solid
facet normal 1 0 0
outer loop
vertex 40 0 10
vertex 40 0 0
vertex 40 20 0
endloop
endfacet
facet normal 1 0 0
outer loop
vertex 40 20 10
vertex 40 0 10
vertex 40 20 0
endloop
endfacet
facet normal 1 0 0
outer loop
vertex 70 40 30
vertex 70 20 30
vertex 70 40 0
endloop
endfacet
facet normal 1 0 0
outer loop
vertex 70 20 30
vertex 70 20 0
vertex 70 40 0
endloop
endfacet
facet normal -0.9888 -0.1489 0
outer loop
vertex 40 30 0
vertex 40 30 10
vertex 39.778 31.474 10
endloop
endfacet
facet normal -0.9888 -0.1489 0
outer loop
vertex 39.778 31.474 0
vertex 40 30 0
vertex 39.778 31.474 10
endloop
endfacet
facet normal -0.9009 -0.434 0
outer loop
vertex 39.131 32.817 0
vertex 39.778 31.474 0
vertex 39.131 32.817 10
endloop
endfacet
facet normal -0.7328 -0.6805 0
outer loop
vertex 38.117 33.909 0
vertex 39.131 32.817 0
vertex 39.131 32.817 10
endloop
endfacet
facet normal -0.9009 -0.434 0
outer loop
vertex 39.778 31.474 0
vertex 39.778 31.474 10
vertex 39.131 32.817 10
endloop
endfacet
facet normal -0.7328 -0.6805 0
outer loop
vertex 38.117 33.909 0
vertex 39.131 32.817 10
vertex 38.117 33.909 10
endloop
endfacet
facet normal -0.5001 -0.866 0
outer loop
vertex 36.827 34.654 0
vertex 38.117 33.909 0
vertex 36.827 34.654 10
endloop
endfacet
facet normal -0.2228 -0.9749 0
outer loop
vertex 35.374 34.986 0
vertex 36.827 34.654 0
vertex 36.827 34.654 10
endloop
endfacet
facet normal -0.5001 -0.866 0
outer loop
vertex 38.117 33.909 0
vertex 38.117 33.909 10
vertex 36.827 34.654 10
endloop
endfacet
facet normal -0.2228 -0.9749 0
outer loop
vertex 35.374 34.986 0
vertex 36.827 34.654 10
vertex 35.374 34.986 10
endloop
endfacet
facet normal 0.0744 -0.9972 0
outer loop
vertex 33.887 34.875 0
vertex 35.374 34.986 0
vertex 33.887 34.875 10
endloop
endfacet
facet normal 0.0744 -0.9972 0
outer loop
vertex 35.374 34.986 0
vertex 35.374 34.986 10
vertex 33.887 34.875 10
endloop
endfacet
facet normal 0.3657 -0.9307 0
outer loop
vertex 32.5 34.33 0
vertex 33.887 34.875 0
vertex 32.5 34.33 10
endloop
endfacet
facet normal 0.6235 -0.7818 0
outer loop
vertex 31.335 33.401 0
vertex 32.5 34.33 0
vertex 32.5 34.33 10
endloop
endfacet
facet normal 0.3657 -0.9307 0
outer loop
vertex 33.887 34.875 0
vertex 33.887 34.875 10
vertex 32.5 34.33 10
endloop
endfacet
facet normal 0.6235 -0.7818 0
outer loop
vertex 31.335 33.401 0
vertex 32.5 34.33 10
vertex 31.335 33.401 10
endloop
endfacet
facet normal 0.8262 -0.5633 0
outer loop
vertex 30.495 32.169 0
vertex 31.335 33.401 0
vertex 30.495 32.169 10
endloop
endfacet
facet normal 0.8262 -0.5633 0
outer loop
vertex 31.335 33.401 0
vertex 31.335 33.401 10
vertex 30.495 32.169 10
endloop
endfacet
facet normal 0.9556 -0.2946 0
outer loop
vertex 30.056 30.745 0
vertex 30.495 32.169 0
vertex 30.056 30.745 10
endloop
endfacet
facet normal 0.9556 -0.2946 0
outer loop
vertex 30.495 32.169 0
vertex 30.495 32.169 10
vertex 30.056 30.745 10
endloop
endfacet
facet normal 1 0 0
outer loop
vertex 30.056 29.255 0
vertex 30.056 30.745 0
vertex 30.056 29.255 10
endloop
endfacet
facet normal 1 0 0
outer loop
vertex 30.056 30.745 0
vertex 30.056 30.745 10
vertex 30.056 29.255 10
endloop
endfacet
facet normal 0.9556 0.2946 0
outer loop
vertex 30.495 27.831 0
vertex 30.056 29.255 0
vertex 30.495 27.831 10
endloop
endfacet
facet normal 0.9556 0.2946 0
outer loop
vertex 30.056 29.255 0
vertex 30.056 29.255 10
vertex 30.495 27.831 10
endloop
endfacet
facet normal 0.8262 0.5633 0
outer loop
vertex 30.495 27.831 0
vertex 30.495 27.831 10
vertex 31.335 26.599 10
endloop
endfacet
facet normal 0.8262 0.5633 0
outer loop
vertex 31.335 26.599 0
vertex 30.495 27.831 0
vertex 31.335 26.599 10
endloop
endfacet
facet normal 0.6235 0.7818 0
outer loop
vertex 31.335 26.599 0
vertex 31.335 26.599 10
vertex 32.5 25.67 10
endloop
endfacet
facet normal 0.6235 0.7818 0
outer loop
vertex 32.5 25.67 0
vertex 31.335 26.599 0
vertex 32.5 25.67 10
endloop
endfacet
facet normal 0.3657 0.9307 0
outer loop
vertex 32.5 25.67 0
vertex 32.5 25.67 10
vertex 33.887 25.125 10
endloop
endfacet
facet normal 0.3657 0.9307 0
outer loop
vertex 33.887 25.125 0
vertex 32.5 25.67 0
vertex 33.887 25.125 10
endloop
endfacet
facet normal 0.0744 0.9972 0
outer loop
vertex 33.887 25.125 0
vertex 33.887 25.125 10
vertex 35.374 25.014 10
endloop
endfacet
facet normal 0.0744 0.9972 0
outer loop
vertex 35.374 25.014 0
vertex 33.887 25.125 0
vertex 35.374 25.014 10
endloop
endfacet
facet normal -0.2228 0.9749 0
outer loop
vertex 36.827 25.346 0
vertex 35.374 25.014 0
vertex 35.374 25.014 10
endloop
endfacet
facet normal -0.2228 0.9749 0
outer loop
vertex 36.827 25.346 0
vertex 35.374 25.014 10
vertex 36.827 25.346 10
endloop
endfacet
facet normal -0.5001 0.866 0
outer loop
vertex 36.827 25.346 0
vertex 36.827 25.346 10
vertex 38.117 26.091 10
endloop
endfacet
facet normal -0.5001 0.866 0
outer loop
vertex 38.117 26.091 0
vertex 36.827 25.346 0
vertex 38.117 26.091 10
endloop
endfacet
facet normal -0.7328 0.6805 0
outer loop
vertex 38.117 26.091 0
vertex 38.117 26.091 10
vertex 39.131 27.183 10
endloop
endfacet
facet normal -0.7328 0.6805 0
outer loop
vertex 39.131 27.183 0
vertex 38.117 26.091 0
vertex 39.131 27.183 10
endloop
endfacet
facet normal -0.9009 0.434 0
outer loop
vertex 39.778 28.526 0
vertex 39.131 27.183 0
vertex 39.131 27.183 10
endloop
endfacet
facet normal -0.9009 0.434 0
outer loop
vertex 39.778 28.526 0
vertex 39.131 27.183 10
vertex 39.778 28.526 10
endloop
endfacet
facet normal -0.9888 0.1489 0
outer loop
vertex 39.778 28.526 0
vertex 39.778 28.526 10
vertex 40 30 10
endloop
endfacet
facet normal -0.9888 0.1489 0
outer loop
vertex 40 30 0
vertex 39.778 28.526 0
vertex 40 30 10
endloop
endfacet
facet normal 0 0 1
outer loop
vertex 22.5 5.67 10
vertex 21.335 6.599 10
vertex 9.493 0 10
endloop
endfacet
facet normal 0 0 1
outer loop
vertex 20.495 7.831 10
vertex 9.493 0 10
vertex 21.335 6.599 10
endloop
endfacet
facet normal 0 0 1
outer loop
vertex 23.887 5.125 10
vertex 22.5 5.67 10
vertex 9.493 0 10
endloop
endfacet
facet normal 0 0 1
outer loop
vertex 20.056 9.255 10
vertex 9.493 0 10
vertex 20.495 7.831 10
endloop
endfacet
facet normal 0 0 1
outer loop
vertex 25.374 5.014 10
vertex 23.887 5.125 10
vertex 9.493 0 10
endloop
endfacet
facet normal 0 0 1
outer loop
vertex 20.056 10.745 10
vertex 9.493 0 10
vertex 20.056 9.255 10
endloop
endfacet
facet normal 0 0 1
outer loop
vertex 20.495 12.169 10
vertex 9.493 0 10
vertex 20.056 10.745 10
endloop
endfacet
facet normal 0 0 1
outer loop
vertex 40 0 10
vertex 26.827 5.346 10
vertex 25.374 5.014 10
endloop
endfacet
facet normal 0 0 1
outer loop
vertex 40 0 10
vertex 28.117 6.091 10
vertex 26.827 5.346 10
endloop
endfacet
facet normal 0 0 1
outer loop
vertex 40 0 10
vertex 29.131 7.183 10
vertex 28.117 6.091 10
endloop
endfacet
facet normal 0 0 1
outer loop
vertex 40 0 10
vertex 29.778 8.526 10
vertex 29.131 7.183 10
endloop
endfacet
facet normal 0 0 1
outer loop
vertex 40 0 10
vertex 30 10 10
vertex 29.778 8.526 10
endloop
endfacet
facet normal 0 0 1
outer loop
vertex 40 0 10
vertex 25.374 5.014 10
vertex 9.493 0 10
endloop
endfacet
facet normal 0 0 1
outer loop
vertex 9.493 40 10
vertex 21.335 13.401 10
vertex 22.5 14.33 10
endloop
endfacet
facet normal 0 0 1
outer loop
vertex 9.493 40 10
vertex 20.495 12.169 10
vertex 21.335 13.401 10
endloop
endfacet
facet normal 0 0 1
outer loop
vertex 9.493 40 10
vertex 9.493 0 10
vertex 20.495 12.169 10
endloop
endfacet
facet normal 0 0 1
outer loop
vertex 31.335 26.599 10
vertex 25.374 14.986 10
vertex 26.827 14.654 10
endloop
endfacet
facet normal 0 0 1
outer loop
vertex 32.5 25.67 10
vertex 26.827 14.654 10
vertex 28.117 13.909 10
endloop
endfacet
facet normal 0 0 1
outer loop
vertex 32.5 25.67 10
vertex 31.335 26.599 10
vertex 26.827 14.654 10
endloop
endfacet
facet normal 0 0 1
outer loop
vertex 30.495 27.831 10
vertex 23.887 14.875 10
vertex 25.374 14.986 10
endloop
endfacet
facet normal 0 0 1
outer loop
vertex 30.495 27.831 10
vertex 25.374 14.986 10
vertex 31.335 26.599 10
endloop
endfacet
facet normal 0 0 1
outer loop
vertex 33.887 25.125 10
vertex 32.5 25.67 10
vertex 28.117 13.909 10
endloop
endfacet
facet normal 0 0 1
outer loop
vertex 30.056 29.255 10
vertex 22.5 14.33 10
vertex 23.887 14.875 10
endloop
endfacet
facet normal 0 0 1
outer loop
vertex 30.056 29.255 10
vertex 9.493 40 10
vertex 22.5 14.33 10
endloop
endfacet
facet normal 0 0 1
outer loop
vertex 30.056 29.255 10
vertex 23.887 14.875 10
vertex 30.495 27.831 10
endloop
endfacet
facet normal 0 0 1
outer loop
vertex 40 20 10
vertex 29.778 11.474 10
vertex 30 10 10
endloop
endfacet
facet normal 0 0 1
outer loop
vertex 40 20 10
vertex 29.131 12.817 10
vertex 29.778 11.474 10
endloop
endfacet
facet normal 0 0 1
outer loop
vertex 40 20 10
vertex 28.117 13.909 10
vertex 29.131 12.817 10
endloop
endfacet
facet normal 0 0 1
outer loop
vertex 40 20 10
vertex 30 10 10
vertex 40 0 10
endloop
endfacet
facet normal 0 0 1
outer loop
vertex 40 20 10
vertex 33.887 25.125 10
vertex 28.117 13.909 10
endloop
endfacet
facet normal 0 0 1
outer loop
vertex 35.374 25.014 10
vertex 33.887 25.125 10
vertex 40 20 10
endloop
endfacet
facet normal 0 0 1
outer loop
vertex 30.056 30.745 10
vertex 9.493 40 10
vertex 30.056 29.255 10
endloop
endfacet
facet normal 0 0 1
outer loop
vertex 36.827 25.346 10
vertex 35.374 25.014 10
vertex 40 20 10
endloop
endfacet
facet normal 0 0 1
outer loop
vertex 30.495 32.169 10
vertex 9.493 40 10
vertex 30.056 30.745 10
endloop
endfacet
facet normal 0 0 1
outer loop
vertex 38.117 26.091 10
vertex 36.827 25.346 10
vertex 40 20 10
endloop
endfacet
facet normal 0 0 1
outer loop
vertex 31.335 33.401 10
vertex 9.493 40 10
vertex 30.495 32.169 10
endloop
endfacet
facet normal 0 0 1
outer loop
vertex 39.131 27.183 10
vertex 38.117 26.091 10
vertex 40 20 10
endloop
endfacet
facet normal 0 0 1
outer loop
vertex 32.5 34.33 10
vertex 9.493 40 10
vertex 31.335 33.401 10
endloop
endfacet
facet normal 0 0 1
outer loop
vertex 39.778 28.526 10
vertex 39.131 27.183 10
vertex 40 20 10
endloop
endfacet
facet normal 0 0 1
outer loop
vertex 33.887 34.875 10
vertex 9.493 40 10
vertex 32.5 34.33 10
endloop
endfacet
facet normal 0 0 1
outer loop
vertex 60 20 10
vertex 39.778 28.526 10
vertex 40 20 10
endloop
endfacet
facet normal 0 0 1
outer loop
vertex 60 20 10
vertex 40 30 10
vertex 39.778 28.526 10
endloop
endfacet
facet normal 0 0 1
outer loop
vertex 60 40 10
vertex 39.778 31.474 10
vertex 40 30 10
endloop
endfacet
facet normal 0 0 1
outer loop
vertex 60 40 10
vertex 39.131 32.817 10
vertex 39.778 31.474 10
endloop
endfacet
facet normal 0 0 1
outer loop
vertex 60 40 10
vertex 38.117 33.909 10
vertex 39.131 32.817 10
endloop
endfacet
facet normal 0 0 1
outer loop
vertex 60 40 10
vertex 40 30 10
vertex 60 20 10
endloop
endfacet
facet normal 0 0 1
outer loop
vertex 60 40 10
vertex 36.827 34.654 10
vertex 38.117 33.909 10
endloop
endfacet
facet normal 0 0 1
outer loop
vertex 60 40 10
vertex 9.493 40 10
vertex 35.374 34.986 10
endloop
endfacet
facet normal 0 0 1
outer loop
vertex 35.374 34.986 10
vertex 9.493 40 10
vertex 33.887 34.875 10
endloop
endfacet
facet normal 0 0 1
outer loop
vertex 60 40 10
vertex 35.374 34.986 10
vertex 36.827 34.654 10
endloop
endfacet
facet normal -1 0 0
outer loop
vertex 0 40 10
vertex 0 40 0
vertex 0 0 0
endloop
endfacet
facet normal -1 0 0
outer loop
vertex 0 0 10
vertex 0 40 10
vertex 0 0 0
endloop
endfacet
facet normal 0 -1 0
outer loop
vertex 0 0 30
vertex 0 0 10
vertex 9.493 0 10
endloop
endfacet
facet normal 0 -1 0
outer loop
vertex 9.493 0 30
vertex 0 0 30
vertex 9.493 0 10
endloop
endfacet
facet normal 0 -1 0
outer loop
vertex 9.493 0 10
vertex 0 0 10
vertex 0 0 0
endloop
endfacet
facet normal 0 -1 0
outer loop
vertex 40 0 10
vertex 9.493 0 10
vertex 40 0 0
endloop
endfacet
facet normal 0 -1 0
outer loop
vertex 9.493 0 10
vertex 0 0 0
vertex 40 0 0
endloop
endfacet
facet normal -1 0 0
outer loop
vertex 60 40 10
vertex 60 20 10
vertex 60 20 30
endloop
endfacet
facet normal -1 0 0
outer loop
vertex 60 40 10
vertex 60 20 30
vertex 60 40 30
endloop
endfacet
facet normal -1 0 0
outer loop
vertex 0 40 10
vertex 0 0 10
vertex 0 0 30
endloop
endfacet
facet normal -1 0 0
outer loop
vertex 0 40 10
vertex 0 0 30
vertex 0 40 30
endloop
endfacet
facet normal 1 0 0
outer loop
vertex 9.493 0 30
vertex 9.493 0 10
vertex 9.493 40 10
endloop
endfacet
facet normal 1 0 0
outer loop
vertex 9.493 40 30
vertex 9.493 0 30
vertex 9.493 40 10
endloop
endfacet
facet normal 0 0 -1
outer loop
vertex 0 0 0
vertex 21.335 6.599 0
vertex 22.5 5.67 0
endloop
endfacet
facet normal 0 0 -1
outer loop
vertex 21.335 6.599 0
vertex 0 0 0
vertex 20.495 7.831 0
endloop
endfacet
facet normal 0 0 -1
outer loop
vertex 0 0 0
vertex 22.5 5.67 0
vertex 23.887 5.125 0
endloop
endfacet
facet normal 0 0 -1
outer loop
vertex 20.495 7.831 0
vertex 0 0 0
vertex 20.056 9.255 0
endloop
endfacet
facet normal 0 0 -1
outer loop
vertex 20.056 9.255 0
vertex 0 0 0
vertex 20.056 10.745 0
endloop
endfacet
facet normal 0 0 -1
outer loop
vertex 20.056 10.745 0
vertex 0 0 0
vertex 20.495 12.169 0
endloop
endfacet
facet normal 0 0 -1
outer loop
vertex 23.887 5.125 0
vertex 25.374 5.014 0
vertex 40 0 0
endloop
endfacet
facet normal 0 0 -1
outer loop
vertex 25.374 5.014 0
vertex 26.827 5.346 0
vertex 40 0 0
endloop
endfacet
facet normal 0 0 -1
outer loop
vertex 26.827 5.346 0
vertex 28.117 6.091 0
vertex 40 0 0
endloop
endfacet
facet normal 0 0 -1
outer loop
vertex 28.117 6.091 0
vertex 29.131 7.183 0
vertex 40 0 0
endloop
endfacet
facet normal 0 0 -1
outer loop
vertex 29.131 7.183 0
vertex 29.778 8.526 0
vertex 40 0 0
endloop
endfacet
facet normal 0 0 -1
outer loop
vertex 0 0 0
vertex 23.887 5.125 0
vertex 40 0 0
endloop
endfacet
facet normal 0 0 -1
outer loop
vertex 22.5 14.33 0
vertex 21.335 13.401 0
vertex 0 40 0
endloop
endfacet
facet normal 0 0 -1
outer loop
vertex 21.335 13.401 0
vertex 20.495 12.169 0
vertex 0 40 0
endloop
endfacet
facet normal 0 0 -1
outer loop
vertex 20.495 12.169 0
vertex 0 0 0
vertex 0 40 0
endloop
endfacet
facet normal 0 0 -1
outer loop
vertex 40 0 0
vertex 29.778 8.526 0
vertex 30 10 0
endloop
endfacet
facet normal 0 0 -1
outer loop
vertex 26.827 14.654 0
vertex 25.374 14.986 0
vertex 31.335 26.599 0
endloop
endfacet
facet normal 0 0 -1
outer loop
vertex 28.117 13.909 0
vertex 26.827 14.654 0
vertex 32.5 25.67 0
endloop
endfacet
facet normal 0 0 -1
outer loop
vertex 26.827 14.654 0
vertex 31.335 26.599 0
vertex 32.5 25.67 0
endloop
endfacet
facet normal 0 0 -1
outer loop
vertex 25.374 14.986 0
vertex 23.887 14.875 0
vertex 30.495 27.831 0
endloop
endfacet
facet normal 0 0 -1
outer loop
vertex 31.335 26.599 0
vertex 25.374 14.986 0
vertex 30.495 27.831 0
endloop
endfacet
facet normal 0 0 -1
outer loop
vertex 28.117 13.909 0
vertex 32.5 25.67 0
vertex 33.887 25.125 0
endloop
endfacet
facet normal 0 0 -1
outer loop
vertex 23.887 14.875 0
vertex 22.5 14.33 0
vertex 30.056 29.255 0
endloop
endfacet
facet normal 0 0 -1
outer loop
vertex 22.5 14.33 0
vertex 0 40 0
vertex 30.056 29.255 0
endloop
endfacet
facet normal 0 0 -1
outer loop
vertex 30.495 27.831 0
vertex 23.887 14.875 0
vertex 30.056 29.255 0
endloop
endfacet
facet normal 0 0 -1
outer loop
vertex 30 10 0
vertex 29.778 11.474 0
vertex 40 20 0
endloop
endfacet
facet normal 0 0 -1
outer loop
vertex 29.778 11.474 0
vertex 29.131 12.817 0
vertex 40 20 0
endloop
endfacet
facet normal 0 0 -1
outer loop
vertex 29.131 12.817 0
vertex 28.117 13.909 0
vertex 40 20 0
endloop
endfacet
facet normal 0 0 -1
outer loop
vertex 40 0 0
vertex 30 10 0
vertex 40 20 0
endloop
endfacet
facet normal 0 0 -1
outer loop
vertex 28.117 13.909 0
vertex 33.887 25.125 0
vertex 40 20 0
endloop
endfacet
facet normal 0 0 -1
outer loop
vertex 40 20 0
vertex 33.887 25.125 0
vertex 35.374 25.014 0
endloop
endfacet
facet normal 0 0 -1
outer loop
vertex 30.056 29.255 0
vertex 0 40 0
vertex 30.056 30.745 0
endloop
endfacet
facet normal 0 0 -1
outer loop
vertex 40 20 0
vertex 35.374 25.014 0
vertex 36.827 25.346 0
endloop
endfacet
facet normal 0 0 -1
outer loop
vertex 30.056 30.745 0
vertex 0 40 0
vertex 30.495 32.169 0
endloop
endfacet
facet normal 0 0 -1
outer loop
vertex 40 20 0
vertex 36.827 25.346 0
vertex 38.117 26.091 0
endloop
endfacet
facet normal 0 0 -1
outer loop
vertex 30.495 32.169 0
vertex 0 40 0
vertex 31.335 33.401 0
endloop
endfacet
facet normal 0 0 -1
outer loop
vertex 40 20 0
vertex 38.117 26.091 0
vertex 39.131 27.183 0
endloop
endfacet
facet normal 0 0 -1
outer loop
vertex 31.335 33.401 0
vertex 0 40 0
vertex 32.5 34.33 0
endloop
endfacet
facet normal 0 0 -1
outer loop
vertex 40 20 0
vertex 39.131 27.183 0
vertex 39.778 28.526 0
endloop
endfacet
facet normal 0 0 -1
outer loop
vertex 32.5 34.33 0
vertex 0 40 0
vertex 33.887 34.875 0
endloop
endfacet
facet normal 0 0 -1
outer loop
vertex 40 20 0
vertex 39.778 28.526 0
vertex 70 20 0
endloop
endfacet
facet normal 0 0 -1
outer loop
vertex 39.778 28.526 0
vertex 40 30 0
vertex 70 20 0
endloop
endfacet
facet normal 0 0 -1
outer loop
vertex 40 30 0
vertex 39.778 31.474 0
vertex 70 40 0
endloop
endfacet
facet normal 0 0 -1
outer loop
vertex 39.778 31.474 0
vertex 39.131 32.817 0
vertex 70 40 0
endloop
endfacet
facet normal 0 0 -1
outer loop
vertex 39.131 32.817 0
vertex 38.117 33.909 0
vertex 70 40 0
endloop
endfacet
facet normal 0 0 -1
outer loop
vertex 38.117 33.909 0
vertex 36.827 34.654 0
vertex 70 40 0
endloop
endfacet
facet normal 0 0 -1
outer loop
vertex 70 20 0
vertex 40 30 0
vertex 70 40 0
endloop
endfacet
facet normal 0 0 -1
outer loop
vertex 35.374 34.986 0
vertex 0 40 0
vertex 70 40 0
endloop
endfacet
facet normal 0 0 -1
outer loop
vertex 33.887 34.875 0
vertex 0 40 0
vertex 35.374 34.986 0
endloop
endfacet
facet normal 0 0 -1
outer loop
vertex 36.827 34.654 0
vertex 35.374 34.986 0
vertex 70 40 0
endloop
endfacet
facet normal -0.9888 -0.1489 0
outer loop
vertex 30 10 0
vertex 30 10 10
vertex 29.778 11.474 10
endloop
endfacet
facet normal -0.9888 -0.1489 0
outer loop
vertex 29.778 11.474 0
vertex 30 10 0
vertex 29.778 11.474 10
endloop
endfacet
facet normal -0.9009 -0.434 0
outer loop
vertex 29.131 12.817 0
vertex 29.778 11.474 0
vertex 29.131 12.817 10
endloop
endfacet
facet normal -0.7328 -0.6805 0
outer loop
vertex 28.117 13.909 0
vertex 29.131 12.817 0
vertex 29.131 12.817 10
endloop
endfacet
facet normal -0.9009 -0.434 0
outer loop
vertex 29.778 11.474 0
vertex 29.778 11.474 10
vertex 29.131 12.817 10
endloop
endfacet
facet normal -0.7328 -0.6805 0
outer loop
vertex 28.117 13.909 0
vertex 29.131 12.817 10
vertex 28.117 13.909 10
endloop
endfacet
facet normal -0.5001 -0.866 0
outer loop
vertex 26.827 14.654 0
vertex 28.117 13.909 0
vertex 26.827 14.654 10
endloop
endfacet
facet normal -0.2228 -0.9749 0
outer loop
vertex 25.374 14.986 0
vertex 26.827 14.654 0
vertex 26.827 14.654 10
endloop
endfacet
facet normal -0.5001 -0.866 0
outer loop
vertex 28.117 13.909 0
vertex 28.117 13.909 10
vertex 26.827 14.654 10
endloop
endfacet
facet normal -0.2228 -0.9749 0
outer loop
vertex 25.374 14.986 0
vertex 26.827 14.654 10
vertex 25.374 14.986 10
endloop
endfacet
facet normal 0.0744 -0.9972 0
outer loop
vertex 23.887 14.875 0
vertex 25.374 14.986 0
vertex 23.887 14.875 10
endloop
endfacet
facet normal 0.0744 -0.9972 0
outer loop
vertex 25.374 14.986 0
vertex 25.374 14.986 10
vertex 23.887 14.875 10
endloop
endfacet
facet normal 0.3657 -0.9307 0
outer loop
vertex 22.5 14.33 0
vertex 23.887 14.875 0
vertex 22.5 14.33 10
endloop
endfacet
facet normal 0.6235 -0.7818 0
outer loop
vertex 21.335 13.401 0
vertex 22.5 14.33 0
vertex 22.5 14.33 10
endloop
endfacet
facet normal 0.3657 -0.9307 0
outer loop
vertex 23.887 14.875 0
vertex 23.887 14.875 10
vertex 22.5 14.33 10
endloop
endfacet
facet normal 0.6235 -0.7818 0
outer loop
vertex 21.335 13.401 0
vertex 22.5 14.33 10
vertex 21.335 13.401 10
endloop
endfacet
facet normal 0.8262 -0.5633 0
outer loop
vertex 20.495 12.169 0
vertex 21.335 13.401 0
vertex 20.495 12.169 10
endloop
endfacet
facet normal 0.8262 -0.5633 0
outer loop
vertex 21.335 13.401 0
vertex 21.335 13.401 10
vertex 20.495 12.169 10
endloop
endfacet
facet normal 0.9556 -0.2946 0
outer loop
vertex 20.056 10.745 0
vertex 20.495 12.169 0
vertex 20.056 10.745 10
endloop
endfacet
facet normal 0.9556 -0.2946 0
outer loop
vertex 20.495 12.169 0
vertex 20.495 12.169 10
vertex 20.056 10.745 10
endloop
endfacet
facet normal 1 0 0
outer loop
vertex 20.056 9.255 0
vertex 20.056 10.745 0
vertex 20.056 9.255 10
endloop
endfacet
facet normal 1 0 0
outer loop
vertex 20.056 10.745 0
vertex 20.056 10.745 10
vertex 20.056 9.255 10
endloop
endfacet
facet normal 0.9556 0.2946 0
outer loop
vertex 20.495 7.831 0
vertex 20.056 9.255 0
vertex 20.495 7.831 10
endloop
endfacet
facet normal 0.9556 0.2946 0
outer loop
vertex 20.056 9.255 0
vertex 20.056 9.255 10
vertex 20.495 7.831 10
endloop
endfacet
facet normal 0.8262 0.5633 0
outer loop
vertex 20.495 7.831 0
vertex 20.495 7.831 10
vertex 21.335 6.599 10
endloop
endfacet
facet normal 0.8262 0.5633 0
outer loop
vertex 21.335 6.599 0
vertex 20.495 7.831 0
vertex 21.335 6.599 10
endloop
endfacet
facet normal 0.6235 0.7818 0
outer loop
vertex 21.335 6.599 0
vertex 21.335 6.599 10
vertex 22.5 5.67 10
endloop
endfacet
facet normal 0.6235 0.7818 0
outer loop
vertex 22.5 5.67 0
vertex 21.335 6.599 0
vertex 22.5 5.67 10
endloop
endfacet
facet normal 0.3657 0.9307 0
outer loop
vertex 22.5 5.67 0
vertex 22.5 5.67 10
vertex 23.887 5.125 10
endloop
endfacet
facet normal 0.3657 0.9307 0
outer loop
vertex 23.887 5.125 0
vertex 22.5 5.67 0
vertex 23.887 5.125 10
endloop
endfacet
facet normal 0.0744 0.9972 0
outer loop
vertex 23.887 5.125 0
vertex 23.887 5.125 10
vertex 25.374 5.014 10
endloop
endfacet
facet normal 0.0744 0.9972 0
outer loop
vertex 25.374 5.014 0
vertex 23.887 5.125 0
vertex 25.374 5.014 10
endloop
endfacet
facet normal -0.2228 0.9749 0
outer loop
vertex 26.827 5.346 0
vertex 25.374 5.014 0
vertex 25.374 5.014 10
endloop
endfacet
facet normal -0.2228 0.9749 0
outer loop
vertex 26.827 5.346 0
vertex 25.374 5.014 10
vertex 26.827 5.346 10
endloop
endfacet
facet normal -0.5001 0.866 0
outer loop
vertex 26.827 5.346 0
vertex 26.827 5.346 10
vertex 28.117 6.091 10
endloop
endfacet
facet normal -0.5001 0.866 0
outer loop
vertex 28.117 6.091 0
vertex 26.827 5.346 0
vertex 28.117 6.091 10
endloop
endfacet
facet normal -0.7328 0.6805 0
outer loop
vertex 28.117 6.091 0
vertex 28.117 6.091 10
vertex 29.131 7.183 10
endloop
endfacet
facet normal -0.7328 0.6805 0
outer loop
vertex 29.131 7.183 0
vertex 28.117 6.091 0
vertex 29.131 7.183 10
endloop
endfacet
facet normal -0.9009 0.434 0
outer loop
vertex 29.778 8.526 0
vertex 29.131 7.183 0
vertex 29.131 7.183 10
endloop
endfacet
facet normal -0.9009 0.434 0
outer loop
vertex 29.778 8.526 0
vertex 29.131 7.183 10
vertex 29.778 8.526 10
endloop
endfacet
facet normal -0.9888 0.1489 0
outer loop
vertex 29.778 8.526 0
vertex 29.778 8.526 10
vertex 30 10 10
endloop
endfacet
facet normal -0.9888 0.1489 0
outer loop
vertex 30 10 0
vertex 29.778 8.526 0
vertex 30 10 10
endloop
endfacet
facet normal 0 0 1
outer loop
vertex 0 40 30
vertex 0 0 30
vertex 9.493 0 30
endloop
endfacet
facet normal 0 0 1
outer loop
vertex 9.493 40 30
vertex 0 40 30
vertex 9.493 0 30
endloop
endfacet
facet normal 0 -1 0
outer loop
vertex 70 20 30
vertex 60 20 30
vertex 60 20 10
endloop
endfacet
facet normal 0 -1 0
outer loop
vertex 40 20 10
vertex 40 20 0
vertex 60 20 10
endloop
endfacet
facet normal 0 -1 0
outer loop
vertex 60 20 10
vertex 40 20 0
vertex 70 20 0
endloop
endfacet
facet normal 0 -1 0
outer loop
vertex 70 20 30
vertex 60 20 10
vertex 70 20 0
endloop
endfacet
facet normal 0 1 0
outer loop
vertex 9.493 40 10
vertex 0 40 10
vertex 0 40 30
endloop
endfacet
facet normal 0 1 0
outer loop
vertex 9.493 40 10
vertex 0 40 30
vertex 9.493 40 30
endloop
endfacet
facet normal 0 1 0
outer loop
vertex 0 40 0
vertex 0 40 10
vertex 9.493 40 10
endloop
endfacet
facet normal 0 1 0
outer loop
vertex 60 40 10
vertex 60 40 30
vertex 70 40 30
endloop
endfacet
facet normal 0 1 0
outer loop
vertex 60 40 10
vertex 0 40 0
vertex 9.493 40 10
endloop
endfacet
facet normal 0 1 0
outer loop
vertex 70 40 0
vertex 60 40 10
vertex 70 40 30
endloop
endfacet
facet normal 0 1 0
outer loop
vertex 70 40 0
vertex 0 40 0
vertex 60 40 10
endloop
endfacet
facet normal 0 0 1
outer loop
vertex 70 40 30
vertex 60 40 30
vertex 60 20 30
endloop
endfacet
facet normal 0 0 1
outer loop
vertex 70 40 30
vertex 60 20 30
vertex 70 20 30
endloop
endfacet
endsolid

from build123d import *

# Parameters (mm, degrees)
F1_DEPTH = 10
F2_W     = 9.492815
F2_H     = 40
F3_DEPTH = 20
F4_W     = 10
F4_H     = 20
F5_DEPTH = 20
F6_R     = 5
F7_DEPTH = 10.001
F8_R     = 5
F9_DEPTH = 10.001


with BuildPart() as f1:
    # F0 (on Top) → F1 (new body)
    with BuildSketch(Plane.XY):
        Polygon((0, 40), (0, 0), (40, 0), (40, 20), (70, 20), (70, 40), align=None)
    extrude(amount=F1_DEPTH)

    # F2 (on face) → F3 (join)
    with BuildSketch(Plane.XY.offset(10)):
        with Locations((4.746408, 20)):
            Rectangle(F2_W, F2_H)
    extrude(amount=F3_DEPTH)

    # F4 (on face) → F5 (join)
    with BuildSketch(Plane.XY.offset(10)):
        with Locations((65, 30)):
            Rectangle(F4_W, F4_H)
    extrude(amount=F5_DEPTH)

    # F6 (on face) → F7 (cut, through all)
    with BuildSketch(Plane.XY.offset(10)):
        with Locations((25, 10)):
            Circle(F6_R)
    extrude(amount=-F7_DEPTH, mode=Mode.SUBTRACT)

    # F8 (on face) → F9 (cut, through all)
    with BuildSketch(Plane.XY.offset(10)):
        with Locations((35, 30)):
            Circle(F8_R)
    extrude(amount=-F9_DEPTH, mode=Mode.SUBTRACT)


solid = f1.part
